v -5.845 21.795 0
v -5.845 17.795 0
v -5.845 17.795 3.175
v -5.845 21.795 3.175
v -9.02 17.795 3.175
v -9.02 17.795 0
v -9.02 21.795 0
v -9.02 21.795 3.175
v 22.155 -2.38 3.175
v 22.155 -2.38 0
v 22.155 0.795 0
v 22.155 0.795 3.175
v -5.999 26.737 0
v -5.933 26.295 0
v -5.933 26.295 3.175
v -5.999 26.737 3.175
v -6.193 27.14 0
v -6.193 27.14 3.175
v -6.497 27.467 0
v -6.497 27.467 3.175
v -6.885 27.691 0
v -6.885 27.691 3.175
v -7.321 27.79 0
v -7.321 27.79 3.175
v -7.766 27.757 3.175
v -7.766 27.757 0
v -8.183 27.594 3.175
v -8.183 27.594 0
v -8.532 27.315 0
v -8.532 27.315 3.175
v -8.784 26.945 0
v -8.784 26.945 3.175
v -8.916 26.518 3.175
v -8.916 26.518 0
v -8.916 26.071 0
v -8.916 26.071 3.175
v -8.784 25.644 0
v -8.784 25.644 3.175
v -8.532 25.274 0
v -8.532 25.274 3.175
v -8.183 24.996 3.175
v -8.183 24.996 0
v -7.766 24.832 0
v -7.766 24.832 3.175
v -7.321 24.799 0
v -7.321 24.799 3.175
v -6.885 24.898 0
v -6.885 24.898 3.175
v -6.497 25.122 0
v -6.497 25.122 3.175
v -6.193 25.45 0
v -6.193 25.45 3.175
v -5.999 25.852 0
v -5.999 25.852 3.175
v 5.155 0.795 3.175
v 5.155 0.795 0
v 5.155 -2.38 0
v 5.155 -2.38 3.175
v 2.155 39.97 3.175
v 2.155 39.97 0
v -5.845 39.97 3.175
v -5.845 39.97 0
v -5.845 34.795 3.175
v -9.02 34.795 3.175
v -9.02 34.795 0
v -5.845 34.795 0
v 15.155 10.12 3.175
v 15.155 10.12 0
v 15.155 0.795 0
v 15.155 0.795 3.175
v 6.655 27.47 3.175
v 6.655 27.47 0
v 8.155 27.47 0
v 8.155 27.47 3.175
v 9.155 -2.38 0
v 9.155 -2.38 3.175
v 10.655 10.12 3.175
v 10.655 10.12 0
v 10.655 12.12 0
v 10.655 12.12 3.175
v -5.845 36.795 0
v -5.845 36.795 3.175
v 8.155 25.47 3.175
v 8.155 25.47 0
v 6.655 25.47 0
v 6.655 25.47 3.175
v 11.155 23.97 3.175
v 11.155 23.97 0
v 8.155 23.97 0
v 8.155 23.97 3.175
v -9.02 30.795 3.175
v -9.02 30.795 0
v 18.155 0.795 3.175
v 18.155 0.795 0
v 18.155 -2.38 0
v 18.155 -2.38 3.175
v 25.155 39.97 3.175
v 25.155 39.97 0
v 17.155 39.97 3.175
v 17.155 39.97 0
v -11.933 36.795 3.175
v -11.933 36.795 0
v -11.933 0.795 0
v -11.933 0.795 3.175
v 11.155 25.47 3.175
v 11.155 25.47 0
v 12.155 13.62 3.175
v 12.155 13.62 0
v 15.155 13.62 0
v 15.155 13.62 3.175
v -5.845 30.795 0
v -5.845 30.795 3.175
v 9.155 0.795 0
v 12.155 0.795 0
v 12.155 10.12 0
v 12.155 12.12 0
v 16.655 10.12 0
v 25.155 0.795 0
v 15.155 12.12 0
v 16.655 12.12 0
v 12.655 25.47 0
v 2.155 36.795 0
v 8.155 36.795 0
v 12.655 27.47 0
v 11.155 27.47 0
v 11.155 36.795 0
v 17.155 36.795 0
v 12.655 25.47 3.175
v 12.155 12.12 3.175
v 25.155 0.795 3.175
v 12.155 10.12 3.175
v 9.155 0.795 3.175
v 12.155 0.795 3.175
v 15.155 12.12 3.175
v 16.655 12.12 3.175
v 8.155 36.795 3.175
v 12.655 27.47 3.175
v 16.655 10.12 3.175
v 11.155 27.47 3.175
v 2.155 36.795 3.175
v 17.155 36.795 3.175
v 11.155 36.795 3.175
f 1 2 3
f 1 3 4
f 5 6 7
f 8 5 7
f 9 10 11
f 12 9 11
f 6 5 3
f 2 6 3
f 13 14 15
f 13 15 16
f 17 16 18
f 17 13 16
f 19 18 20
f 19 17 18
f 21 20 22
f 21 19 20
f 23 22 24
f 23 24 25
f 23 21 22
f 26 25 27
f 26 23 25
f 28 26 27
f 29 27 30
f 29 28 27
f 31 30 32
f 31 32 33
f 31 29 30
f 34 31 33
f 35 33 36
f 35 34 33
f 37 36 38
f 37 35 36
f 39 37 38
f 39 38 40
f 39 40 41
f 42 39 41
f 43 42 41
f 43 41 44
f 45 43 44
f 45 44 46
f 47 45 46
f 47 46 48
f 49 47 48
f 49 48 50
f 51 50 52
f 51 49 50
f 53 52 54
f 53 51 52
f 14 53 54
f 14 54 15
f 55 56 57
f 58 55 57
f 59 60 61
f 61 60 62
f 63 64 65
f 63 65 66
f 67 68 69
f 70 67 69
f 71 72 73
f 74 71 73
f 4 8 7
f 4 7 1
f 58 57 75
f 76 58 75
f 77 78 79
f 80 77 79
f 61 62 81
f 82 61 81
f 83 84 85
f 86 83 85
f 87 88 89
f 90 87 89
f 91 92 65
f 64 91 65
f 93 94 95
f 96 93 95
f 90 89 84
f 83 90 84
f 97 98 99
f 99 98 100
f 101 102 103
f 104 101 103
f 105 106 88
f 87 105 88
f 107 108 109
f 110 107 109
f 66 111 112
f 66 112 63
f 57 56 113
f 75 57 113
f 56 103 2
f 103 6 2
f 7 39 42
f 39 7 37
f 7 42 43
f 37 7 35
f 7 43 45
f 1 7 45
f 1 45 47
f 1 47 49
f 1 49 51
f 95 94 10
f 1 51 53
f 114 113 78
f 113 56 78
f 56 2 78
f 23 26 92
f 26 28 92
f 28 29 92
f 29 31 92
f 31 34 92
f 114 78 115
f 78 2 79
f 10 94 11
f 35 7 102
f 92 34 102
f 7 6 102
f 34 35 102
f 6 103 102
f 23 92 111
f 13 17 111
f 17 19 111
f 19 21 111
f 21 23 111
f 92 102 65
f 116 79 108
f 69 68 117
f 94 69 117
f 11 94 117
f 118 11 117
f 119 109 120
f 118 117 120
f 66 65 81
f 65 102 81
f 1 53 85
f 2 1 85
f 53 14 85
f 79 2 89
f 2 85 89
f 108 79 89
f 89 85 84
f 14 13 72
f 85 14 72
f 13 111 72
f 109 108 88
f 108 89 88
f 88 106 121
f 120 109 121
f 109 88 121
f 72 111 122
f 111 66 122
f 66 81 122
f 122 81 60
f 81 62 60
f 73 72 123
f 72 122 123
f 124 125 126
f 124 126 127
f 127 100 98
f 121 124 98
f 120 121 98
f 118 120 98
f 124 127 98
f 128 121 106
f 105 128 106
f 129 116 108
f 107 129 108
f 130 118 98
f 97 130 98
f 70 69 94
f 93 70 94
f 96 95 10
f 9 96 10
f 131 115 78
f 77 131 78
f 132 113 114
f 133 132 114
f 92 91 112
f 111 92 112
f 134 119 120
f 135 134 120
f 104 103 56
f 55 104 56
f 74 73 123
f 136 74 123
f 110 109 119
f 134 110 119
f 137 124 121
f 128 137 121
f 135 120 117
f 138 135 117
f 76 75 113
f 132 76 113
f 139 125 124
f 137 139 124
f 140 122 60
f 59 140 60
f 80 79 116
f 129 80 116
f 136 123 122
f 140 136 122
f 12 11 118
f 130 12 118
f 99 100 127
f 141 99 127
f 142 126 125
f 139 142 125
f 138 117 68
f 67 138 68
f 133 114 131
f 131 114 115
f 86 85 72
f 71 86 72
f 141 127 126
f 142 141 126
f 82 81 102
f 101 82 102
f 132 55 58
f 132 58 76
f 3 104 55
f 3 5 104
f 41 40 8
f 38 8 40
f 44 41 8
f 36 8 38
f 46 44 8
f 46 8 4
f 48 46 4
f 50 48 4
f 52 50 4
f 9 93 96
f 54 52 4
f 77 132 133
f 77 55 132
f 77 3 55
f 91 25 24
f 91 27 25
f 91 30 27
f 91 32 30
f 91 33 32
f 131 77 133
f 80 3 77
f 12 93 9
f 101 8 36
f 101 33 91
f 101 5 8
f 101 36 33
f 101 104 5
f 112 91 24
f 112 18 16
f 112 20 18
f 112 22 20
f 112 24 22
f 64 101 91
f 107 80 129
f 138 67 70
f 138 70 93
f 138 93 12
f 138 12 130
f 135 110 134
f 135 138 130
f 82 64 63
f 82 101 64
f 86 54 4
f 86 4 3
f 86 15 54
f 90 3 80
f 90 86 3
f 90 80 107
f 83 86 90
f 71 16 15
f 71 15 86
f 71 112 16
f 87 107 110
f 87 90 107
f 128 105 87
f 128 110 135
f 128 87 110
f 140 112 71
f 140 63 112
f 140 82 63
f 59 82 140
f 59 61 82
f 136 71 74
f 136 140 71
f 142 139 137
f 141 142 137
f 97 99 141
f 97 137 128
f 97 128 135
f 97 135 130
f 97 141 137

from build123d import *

# Parameters (mm, degrees)
F0_W     = 3.175
F0_H     = 4
F0_R     = 1.5
F1_DEPTH = 3.175


# Not quite as in the source:
# - a length typed as a fraction of an inch, garbled in the dataset ("3 / 203.2 mm" for 3/8 in), is restored
# - a feature names something its author has since deleted; it is built from what else it names


with BuildPart() as f1:
    # F0 (on Top) → F1 (new body)
    with BuildSketch(Plane.XY):
        Polygon((11.1548891366, 23.9696219414), (8.1548891366, 23.9696219414), (8.1548891366, 25.4696219414), (6.6548891366, 25.4696219414), (6.6548891366, 27.4696219414), (8.1548891366, 27.4696219414), (8.1548891366, 36.7946219414), (2.1548891366, 36.7946219414), (2.1548891366, 39.9696219414), (-5.8451108634, 39.9696219414), (-5.8451108634, 36.7946219414), (-11.9326108634, 36.7946219414), (-11.9326108634, 0.7946219414), (5.1548891366, 0.7946219414), (5.1548891366, -2.3803780586), (9.1548891366, -2.3803780586), (9.1548891366, 0.7946219414), (12.1548891366, 0.7946219414), (12.1548891366, 10.1196219414), (10.6548891366, 10.1196219414), (10.6548891366, 12.1196219414), (12.1548891366, 12.1196219414), (12.1548891366, 13.6196219414), (15.1548891366, 13.6196219414), (15.1548891366, 12.1196219414), (16.6548891366, 12.1196219414), (16.6548891366, 10.1196219414), (15.1548891366, 10.1196219414), (15.1548891366, 0.7946219414), (18.1548891366, 0.7946219414), (18.1548891366, -2.3803780586), (22.1548891366, -2.3803780586), (22.1548891366, 0.7946219414), (25.1548891366, 0.7946219414), (25.1548891366, 36.7946219414), (25.1548891366, 39.9696219414), (17.1548891366, 39.9696219414), (17.1548891366, 36.7946219414), (11.1548891366, 36.7946219414), (11.1548891366, 27.4696219414), (12.6548891366, 27.4696219414), (12.6548891366, 25.4696219414), (11.1548891366, 25.4696219414), align=None)
        with Locations((-7.4326108634, 19.7946219414)):
            Rectangle(F0_W, F0_H, mode=Mode.SUBTRACT)
        with Locations((-7.4326108634, 26.2946219414)):
            Circle(F0_R, mode=Mode.SUBTRACT)
        with Locations((-7.4326108634, 32.7946219414)):
            Rectangle(F0_W, F0_H, mode=Mode.SUBTRACT)
    extrude(amount=F1_DEPTH)


solid = f1.part
